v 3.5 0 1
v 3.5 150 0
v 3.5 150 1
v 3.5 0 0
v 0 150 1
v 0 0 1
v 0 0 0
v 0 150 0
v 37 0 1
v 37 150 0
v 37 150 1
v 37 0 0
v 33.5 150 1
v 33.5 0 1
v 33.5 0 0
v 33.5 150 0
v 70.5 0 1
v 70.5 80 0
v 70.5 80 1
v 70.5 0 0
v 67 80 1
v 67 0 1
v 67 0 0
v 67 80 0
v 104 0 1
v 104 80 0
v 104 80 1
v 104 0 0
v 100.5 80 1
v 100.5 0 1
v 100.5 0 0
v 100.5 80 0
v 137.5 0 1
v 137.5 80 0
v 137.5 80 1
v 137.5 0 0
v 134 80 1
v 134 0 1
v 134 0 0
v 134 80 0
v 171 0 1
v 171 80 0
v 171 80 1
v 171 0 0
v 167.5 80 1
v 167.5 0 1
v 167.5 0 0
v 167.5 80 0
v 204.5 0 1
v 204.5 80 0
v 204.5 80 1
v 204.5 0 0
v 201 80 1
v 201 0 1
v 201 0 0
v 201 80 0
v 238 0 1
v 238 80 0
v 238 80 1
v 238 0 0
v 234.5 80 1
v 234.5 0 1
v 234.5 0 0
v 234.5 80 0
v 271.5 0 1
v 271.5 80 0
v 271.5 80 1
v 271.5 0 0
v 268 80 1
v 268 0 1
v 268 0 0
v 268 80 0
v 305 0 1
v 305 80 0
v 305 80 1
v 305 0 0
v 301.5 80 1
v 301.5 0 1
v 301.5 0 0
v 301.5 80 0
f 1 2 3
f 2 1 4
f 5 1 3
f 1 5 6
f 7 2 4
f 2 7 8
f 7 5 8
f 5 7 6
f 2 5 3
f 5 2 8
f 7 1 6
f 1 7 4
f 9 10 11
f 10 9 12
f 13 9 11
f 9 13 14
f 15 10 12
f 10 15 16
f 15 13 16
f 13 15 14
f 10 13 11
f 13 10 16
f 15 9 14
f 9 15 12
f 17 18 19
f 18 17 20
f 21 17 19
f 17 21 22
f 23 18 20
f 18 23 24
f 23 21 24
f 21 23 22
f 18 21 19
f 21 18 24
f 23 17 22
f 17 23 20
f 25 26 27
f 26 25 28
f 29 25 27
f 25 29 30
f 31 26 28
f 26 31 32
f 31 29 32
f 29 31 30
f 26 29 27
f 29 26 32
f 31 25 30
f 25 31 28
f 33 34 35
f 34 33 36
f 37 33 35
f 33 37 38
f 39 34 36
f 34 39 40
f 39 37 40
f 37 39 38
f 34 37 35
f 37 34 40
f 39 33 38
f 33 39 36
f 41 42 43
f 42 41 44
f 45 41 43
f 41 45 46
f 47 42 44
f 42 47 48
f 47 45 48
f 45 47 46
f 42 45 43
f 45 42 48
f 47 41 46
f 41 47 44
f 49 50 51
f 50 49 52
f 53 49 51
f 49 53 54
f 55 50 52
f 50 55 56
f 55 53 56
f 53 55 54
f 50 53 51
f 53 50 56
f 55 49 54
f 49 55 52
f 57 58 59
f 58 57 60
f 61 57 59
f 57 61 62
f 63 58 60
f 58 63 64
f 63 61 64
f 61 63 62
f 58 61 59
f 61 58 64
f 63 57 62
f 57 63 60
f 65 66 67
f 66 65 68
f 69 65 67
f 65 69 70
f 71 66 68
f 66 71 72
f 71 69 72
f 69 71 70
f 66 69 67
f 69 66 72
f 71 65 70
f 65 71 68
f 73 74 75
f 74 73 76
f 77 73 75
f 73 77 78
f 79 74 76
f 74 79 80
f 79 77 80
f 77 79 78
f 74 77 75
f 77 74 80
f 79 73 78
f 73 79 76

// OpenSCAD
translate([0, 0, 0]) {
 cube([3.5, 150, 1]); 
}translate([33.5, 0, 0]) {
 cube([3.5, 150, 1]); 
}translate([67.0, 0, 0]) {
 cube([3.5, 80, 1]); 
}translate([100.5, 0, 0]) {
 cube([3.5, 80, 1]); 
}translate([134.0, 0, 0]) {
 cube([3.5, 80, 1]); 
}translate([167.5, 0, 0]) {
 cube([3.5, 80, 1]); 
}translate([201.0, 0, 0]) {
 cube([3.5, 80, 1]); 
}translate([234.5, 0, 0]) {
 cube([3.5, 80, 1]); 
}translate([268.0, 0, 0]) {
 cube([3.5, 80, 1]); 
}translate([301.5, 0, 0]) {
 cube([3.5, 80, 1]); 
}
